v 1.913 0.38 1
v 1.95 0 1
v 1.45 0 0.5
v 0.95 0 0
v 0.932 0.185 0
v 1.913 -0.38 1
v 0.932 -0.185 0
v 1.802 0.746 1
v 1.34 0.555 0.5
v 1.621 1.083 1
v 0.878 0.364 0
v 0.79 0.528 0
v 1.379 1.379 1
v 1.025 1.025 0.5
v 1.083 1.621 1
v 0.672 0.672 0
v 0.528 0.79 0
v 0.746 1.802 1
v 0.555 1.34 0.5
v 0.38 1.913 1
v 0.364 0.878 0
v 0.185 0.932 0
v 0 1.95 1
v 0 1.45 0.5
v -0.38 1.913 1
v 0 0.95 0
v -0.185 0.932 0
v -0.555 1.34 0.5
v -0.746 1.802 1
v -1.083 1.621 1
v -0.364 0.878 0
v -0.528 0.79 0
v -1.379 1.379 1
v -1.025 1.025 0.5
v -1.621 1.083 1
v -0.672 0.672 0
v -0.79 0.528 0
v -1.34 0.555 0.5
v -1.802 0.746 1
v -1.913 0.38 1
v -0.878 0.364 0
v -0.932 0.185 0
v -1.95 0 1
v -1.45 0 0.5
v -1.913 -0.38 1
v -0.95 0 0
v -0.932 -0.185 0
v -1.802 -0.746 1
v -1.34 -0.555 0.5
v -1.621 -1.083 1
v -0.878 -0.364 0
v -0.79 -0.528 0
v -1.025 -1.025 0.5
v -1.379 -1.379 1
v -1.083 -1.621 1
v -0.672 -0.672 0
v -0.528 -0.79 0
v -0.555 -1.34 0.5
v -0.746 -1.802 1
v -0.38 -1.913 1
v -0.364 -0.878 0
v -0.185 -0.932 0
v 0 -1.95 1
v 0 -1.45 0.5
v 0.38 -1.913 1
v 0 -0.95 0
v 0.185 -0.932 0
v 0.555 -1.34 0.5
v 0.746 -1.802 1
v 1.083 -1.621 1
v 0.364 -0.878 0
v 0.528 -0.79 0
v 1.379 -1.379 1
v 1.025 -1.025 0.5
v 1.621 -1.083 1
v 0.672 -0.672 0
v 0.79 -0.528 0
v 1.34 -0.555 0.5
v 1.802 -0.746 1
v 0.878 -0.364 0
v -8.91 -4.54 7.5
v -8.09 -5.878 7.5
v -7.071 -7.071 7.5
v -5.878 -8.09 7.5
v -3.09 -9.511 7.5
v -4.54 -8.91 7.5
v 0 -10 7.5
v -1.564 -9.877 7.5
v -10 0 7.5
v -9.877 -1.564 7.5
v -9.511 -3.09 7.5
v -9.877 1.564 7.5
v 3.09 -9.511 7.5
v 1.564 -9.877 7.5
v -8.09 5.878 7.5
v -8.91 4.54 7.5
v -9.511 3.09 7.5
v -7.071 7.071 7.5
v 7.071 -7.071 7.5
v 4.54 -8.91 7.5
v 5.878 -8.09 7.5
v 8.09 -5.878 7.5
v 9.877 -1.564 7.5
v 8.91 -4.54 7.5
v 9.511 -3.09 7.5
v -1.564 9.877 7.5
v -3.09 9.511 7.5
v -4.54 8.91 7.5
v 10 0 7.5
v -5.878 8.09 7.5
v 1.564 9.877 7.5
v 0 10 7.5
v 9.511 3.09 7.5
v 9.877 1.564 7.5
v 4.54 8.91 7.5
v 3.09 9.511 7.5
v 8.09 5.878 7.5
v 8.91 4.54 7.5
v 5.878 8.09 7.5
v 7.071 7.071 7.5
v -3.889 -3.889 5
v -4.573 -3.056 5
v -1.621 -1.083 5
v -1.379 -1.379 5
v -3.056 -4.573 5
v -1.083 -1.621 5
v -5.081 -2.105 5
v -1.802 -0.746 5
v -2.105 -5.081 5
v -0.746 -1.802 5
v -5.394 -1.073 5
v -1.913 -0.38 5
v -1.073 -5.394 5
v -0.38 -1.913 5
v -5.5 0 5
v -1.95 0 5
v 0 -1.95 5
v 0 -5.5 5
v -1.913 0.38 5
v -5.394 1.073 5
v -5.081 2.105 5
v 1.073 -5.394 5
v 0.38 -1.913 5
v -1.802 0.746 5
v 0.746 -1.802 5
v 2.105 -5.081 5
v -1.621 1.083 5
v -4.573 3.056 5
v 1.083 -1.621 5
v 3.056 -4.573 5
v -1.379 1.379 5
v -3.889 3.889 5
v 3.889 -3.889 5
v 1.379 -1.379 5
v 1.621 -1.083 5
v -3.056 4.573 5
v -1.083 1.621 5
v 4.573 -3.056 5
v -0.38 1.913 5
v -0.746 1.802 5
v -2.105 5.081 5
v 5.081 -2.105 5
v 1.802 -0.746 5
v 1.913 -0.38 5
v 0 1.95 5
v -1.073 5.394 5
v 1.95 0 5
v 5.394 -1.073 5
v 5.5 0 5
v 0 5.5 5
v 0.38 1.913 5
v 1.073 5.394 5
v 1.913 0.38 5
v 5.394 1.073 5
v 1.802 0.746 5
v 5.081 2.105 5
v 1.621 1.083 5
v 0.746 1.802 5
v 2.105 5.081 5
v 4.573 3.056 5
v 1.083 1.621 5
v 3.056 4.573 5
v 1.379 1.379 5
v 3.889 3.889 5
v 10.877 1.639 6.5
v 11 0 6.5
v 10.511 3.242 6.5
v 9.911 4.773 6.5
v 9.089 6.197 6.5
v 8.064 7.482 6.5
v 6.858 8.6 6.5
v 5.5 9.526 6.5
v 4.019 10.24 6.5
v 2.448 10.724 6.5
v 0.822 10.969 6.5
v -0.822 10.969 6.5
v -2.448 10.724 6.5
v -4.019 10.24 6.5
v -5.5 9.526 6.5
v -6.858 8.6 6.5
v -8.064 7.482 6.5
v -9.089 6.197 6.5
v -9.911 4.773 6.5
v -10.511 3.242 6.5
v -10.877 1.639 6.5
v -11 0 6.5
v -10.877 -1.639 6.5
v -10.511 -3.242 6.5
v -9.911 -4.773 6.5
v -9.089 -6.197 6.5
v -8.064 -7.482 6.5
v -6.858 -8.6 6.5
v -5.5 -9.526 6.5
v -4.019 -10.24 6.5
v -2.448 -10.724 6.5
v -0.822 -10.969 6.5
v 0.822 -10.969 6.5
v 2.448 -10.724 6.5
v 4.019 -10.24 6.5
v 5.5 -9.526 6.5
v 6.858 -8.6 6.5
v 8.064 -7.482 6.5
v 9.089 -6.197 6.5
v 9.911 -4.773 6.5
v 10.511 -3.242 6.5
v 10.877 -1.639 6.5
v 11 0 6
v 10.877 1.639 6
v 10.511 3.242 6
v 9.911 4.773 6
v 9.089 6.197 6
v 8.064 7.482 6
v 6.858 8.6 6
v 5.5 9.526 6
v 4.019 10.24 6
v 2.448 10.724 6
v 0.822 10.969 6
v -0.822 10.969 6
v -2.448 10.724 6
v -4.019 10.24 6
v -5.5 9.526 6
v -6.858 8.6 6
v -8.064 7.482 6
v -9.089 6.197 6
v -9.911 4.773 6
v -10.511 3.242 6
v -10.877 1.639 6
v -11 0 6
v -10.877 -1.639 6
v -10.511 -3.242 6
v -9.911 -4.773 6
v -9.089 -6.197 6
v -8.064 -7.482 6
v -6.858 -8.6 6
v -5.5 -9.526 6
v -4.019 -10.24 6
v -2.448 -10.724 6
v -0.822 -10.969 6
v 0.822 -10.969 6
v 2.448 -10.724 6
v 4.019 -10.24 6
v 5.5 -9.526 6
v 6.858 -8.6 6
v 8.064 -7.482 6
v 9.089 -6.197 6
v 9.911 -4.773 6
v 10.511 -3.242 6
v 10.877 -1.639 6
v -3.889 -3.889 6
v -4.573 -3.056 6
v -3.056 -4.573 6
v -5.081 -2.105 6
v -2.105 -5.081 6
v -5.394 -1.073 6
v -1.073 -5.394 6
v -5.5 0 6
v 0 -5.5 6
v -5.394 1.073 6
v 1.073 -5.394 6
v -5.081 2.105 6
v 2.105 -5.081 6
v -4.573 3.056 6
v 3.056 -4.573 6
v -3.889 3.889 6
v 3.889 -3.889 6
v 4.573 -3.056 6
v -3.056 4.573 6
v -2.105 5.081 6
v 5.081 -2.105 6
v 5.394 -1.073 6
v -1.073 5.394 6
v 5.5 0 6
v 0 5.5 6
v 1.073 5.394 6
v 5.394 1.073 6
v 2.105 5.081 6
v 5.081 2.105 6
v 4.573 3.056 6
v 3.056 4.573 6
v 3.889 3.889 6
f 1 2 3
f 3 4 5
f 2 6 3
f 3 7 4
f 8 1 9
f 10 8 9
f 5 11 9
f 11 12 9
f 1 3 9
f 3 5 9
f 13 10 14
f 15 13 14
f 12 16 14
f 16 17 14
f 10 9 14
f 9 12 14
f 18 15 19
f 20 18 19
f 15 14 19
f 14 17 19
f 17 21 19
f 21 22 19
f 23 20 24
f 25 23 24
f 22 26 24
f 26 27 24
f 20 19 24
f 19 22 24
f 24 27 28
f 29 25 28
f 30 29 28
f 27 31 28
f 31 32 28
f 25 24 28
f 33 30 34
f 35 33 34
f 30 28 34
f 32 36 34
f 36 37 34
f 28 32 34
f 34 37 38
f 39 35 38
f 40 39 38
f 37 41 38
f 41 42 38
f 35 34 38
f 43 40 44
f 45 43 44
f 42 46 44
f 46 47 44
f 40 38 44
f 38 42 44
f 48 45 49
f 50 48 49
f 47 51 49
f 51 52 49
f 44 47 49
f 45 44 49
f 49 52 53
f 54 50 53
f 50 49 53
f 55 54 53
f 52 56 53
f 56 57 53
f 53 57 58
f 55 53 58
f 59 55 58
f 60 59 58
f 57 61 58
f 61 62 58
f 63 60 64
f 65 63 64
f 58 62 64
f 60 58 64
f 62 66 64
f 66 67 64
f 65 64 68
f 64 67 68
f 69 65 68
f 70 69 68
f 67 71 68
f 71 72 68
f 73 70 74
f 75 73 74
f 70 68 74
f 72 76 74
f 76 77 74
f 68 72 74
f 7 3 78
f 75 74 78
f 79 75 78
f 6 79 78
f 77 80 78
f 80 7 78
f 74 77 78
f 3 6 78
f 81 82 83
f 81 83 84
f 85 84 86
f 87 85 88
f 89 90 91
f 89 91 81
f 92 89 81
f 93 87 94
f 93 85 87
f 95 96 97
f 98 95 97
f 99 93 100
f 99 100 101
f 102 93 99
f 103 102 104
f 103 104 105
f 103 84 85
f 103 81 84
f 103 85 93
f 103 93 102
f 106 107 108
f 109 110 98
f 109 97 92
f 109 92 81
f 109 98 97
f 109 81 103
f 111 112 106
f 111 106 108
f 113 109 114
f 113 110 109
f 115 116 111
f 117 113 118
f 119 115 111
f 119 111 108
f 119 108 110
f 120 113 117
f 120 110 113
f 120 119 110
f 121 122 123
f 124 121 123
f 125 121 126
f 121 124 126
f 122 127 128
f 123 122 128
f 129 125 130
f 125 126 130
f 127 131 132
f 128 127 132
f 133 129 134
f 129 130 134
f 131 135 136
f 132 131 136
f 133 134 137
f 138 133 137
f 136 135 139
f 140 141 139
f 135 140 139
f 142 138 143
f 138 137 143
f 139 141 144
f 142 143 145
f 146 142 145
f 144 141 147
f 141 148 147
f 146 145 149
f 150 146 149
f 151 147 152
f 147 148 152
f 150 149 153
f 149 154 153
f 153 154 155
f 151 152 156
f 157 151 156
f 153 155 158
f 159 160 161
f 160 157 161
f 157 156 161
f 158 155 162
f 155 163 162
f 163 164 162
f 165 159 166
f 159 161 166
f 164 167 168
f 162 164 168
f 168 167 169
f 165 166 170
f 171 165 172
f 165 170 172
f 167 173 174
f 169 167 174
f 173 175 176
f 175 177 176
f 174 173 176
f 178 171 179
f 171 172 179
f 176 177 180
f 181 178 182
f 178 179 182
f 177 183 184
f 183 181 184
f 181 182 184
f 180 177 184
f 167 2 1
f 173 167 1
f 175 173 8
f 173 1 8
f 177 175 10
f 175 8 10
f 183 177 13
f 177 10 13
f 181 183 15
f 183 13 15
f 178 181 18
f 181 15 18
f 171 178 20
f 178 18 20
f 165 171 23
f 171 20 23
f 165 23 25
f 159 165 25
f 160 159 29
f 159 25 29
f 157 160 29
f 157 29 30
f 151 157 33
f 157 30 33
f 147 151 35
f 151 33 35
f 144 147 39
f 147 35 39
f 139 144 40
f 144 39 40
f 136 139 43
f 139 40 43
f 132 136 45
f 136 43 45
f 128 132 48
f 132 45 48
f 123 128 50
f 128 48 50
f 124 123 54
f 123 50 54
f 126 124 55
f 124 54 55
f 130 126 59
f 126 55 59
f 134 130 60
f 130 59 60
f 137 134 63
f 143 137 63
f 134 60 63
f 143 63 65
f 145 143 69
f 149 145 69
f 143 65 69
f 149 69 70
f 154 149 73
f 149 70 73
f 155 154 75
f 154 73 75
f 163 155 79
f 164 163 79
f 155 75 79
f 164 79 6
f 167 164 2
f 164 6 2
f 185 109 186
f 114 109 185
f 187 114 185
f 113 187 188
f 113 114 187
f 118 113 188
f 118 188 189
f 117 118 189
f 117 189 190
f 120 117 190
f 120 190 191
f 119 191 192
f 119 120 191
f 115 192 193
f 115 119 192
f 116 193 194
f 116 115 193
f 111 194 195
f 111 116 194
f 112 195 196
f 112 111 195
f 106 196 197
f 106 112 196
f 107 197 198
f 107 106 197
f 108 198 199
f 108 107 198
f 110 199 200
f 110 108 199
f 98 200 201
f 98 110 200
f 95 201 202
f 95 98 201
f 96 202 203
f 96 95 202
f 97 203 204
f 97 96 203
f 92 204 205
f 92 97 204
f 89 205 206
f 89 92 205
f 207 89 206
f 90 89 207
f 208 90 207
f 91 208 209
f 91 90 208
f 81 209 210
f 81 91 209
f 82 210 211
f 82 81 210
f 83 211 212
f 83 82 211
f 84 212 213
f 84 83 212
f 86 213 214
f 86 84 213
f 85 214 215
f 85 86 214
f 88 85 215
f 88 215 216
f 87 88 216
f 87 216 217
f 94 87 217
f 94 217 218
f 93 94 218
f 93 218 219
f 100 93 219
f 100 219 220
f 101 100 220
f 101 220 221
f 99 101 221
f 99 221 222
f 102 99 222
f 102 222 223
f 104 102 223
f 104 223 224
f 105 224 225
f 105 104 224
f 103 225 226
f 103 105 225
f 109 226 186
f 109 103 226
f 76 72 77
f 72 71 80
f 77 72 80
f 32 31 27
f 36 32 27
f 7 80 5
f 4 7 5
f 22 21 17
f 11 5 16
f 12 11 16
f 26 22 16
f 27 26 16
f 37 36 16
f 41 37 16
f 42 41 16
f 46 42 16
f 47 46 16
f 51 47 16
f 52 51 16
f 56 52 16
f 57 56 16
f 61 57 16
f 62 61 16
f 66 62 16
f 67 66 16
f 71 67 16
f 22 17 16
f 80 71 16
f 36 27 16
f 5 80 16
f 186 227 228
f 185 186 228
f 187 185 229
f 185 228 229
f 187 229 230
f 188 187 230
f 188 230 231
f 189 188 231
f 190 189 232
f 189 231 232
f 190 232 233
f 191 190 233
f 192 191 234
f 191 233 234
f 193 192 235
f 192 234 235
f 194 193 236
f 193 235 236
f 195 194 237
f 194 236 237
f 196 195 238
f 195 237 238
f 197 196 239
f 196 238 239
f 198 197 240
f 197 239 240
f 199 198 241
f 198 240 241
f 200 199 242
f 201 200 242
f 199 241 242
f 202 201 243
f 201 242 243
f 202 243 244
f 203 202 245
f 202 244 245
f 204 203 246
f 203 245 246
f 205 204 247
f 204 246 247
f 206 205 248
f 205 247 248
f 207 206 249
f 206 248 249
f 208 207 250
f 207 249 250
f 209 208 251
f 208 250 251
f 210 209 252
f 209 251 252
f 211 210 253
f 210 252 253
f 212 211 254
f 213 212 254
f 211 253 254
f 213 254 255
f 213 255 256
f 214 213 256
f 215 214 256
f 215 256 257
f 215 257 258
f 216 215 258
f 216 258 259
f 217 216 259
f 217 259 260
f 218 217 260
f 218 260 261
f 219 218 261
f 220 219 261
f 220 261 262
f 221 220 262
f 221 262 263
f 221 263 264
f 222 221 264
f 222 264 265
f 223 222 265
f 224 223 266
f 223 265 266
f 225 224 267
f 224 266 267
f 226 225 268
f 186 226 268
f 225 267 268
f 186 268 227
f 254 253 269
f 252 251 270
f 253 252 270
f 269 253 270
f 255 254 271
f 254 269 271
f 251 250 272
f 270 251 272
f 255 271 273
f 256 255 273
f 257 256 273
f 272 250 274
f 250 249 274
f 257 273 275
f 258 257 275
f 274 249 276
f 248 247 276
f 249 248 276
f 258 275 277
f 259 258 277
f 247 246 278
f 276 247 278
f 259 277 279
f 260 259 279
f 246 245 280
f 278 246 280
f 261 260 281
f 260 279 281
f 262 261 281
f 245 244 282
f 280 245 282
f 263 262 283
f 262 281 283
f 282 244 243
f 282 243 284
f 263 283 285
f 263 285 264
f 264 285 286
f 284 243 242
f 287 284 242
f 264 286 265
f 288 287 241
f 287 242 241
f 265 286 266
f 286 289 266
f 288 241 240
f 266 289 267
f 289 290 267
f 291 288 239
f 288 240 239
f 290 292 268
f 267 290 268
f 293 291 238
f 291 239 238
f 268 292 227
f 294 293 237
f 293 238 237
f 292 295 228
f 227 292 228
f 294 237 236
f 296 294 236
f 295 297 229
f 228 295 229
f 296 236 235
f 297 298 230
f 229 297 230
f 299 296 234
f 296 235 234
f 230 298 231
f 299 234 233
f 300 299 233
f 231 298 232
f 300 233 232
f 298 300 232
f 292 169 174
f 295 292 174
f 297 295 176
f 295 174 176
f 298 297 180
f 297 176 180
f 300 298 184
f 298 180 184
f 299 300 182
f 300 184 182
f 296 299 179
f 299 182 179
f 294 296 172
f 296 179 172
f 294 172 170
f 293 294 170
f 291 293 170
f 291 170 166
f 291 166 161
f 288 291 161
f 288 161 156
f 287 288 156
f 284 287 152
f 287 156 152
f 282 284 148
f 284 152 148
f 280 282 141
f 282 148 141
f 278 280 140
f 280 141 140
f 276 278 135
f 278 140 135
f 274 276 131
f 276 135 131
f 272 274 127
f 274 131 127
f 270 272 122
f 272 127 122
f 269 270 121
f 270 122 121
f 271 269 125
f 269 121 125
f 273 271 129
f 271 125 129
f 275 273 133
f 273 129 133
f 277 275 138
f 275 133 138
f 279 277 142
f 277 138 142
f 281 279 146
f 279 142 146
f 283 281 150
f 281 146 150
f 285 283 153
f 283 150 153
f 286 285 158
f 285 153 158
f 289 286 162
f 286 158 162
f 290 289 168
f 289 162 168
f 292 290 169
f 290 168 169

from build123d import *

# Parameters (mm, degrees)
F0_R     = 1.95
F1_DEPTH = 5
F2_R     = 5.5
F2_R_2   = 1.95
F3_DEPTH = 1
F4_R     = 11
F5_DEPTH = 1.5
F6_SIZE  = 1


with BuildPart() as f1:
    # F0 (on Top) → F1 (new body)
    with BuildSketch(Plane.XY):
        Circle(F0_R)
    extrude(amount=F1_DEPTH)

    # F2 (on face) → F3 (join)
    with BuildSketch(Plane.XY.offset(5)):
        Circle(F2_R)
        Circle(F2_R_2, mode=Mode.SUBTRACT)
        Circle(F2_R_2)
    extrude(amount=F3_DEPTH)

    # F4 (on face) → F5 (join)
    with BuildSketch(Plane.XY.offset(6)):
        Circle(F4_R)
    extrude(amount=F5_DEPTH)

    # F6
    f6_edges = [f1.edges().sort_by_distance(p)[0] for p in [
        (-11, 0, 7.5),
        (-1.95, 0, 0),
    ]]
    chamfer(f6_edges, length=F6_SIZE)


solid = f1.part
